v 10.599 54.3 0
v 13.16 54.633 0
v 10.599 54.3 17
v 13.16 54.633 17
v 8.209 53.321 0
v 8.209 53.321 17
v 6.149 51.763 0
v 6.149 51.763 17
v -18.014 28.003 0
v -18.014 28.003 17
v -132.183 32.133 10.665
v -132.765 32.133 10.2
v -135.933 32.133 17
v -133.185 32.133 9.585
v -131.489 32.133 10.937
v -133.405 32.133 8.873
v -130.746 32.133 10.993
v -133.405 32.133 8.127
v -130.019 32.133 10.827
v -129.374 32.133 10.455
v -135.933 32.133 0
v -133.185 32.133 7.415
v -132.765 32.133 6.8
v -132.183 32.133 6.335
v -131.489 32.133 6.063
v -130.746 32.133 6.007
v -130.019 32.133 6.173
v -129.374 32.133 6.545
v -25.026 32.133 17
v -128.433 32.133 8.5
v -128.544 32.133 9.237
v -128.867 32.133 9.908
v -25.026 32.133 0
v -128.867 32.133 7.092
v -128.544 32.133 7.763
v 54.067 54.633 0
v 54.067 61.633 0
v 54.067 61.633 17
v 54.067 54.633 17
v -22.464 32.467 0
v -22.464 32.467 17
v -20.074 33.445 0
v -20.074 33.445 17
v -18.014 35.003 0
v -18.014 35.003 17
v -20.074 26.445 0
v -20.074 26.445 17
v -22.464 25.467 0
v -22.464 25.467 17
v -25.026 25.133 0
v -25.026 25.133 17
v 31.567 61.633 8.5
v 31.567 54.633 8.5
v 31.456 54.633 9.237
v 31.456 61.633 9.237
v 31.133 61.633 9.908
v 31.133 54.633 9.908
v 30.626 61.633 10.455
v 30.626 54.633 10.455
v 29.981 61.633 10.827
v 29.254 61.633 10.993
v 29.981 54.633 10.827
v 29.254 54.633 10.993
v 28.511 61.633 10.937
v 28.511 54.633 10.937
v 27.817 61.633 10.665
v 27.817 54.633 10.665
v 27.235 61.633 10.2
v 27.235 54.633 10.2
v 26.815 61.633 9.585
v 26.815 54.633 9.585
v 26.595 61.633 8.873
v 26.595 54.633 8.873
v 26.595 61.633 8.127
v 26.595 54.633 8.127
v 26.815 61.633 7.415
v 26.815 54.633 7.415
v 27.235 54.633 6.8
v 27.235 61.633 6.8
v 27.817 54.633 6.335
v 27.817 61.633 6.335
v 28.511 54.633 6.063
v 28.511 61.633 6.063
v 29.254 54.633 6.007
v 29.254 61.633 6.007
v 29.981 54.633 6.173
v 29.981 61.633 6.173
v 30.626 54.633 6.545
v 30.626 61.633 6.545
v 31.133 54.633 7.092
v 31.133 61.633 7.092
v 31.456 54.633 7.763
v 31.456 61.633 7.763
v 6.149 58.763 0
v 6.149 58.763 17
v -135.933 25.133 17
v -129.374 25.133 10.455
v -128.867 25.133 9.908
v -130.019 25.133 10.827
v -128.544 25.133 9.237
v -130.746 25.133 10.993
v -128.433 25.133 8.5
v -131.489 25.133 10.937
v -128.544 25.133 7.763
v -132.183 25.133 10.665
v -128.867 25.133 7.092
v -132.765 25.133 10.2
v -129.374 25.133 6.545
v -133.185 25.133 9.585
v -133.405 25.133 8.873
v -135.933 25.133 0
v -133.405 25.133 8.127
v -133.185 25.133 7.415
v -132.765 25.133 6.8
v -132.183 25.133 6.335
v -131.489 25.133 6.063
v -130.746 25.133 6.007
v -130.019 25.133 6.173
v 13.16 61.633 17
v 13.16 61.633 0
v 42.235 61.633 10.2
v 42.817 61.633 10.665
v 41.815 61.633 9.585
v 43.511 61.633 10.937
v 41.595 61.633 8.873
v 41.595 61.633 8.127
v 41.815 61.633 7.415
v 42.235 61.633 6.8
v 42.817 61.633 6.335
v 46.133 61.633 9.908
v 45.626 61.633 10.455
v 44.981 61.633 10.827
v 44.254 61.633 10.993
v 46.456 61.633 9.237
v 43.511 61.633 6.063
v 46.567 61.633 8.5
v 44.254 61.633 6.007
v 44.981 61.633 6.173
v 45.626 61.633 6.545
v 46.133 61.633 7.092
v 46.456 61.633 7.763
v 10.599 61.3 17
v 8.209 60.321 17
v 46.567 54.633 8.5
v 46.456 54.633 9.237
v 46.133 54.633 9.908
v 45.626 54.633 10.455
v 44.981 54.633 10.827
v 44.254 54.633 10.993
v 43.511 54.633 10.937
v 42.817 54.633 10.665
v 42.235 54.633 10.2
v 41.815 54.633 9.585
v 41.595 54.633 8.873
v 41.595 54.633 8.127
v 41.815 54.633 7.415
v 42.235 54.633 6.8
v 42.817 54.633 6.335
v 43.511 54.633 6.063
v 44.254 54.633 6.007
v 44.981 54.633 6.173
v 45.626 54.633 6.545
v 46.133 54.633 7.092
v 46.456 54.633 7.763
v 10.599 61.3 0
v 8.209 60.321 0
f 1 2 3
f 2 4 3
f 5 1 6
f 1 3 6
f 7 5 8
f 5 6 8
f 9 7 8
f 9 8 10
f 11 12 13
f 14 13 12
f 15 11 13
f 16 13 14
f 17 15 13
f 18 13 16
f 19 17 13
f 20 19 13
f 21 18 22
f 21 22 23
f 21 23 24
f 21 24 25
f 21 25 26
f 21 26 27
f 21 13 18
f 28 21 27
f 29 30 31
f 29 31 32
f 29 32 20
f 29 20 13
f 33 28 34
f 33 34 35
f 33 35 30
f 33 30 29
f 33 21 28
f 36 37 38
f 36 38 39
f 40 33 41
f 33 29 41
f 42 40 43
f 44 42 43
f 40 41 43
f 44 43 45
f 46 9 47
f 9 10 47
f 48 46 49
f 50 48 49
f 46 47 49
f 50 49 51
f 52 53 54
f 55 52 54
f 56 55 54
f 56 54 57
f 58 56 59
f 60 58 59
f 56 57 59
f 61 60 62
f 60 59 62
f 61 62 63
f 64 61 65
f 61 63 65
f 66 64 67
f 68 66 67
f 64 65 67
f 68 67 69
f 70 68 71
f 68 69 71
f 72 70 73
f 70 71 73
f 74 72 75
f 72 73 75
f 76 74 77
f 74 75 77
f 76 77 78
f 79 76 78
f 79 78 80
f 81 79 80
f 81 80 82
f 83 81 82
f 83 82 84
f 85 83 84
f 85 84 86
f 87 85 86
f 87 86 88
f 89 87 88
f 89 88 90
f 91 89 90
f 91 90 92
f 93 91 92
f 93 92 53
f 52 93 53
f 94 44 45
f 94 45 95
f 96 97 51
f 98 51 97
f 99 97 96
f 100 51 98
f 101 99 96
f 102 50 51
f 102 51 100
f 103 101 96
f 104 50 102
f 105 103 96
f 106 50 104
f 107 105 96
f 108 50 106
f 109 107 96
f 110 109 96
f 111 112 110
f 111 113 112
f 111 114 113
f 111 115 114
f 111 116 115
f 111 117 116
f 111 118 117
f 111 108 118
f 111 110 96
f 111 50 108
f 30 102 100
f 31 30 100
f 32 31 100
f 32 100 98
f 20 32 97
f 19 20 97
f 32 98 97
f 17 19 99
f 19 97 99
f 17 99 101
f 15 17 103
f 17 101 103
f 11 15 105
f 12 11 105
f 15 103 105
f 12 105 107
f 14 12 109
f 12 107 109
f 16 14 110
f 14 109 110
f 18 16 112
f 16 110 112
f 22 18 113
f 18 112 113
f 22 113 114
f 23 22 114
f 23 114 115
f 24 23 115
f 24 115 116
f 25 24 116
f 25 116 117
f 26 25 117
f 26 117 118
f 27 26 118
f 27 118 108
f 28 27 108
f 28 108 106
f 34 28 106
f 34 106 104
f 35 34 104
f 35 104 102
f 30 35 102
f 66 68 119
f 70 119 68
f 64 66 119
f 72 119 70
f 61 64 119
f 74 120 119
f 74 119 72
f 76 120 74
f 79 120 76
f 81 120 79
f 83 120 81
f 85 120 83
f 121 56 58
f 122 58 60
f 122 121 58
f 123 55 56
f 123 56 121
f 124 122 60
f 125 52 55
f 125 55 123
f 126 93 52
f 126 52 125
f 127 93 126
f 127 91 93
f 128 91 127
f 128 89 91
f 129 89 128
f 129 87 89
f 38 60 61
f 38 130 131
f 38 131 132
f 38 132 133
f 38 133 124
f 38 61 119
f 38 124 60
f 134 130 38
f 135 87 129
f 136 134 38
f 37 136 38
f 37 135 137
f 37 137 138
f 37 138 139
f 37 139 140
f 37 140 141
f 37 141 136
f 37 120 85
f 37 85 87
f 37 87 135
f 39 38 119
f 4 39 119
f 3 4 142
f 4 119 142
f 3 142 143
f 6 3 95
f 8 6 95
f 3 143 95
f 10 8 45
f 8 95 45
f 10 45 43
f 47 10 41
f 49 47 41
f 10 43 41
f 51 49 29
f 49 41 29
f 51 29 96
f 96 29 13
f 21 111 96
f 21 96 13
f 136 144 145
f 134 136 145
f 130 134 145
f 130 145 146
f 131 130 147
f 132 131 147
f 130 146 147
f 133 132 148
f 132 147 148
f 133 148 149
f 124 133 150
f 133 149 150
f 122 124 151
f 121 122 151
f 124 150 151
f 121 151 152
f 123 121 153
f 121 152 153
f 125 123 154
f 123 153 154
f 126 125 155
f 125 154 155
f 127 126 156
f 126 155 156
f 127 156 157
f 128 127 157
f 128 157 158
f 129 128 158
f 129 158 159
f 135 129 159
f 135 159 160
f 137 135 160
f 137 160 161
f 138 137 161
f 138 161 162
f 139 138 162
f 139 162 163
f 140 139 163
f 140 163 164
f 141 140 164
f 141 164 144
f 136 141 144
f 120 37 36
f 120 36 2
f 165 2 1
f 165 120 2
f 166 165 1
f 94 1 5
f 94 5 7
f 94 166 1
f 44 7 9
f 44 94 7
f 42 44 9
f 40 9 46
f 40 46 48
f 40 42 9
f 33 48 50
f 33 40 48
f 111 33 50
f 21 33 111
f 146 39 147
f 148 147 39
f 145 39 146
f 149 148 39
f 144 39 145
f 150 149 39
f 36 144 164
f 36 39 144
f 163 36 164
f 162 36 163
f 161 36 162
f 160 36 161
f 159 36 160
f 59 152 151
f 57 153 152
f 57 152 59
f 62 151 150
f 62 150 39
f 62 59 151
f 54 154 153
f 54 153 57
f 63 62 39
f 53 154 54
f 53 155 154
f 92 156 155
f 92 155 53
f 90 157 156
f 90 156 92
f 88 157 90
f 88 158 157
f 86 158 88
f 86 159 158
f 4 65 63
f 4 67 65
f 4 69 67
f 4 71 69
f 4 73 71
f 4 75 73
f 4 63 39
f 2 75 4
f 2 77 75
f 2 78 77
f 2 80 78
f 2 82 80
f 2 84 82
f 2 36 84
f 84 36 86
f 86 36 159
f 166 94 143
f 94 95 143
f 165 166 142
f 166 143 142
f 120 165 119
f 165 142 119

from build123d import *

# Parameters (mm, degrees)
EXTRUDE1_DEPTH = 17
FILLET1_R      = 10
SKETCH2_R      = 2.5
EXTRUDE2_DEPTH = 17
SKETCH3_R      = 2.5
EXTRUDE3_DEPTH = 17


with BuildPart() as part:
    # Sketch1 → Extrude1 (new body)
    with BuildSketch(Plane.XY):
        Polygon((-135.932508131, 32.133218497), (-20.932508131, 32.133218497), (9.067491869, 61.633218497), (54.067491869, 61.633218497), (54.067491869, 54.633218497), (9.067491869, 54.633218497), (-20.932508131, 25.133218497), (-135.932508131, 25.133218497), align=None)
    extrude(amount=EXTRUDE1_DEPTH)

    # Fillet1
    fillet1_edges = [part.edges().sort_by_distance(p)[0] for p in [
        (-20.932508131, 32.133218497, 8.5),
        (9.067491869, 61.633218497, 8.5),
        (9.067491869, 54.633218497, 8.5),
        (-20.932508131, 25.133218497, 8.5),
    ]]
    fillet(fillet1_edges, radius=FILLET1_R)

    # Sketch2 → Extrude2 (cut)
    with BuildSketch(Plane.XZ.offset(-54.633218497)):
        with Locations((44.067491869, 8.5)):
            Circle(SKETCH2_R)
        with Locations((29.067491869, 8.5)):
            Circle(SKETCH2_R)
    extrude(amount=-EXTRUDE2_DEPTH, mode=Mode.SUBTRACT)

    # Sketch3 → Extrude3 (cut)
    with BuildSketch(Plane.XZ.offset(-25.133218497)):
        with Locations((-130.932508131, 8.5)):
            Circle(SKETCH3_R)
    extrude(amount=-EXTRUDE3_DEPTH, mode=Mode.SUBTRACT)


solid = part.part
